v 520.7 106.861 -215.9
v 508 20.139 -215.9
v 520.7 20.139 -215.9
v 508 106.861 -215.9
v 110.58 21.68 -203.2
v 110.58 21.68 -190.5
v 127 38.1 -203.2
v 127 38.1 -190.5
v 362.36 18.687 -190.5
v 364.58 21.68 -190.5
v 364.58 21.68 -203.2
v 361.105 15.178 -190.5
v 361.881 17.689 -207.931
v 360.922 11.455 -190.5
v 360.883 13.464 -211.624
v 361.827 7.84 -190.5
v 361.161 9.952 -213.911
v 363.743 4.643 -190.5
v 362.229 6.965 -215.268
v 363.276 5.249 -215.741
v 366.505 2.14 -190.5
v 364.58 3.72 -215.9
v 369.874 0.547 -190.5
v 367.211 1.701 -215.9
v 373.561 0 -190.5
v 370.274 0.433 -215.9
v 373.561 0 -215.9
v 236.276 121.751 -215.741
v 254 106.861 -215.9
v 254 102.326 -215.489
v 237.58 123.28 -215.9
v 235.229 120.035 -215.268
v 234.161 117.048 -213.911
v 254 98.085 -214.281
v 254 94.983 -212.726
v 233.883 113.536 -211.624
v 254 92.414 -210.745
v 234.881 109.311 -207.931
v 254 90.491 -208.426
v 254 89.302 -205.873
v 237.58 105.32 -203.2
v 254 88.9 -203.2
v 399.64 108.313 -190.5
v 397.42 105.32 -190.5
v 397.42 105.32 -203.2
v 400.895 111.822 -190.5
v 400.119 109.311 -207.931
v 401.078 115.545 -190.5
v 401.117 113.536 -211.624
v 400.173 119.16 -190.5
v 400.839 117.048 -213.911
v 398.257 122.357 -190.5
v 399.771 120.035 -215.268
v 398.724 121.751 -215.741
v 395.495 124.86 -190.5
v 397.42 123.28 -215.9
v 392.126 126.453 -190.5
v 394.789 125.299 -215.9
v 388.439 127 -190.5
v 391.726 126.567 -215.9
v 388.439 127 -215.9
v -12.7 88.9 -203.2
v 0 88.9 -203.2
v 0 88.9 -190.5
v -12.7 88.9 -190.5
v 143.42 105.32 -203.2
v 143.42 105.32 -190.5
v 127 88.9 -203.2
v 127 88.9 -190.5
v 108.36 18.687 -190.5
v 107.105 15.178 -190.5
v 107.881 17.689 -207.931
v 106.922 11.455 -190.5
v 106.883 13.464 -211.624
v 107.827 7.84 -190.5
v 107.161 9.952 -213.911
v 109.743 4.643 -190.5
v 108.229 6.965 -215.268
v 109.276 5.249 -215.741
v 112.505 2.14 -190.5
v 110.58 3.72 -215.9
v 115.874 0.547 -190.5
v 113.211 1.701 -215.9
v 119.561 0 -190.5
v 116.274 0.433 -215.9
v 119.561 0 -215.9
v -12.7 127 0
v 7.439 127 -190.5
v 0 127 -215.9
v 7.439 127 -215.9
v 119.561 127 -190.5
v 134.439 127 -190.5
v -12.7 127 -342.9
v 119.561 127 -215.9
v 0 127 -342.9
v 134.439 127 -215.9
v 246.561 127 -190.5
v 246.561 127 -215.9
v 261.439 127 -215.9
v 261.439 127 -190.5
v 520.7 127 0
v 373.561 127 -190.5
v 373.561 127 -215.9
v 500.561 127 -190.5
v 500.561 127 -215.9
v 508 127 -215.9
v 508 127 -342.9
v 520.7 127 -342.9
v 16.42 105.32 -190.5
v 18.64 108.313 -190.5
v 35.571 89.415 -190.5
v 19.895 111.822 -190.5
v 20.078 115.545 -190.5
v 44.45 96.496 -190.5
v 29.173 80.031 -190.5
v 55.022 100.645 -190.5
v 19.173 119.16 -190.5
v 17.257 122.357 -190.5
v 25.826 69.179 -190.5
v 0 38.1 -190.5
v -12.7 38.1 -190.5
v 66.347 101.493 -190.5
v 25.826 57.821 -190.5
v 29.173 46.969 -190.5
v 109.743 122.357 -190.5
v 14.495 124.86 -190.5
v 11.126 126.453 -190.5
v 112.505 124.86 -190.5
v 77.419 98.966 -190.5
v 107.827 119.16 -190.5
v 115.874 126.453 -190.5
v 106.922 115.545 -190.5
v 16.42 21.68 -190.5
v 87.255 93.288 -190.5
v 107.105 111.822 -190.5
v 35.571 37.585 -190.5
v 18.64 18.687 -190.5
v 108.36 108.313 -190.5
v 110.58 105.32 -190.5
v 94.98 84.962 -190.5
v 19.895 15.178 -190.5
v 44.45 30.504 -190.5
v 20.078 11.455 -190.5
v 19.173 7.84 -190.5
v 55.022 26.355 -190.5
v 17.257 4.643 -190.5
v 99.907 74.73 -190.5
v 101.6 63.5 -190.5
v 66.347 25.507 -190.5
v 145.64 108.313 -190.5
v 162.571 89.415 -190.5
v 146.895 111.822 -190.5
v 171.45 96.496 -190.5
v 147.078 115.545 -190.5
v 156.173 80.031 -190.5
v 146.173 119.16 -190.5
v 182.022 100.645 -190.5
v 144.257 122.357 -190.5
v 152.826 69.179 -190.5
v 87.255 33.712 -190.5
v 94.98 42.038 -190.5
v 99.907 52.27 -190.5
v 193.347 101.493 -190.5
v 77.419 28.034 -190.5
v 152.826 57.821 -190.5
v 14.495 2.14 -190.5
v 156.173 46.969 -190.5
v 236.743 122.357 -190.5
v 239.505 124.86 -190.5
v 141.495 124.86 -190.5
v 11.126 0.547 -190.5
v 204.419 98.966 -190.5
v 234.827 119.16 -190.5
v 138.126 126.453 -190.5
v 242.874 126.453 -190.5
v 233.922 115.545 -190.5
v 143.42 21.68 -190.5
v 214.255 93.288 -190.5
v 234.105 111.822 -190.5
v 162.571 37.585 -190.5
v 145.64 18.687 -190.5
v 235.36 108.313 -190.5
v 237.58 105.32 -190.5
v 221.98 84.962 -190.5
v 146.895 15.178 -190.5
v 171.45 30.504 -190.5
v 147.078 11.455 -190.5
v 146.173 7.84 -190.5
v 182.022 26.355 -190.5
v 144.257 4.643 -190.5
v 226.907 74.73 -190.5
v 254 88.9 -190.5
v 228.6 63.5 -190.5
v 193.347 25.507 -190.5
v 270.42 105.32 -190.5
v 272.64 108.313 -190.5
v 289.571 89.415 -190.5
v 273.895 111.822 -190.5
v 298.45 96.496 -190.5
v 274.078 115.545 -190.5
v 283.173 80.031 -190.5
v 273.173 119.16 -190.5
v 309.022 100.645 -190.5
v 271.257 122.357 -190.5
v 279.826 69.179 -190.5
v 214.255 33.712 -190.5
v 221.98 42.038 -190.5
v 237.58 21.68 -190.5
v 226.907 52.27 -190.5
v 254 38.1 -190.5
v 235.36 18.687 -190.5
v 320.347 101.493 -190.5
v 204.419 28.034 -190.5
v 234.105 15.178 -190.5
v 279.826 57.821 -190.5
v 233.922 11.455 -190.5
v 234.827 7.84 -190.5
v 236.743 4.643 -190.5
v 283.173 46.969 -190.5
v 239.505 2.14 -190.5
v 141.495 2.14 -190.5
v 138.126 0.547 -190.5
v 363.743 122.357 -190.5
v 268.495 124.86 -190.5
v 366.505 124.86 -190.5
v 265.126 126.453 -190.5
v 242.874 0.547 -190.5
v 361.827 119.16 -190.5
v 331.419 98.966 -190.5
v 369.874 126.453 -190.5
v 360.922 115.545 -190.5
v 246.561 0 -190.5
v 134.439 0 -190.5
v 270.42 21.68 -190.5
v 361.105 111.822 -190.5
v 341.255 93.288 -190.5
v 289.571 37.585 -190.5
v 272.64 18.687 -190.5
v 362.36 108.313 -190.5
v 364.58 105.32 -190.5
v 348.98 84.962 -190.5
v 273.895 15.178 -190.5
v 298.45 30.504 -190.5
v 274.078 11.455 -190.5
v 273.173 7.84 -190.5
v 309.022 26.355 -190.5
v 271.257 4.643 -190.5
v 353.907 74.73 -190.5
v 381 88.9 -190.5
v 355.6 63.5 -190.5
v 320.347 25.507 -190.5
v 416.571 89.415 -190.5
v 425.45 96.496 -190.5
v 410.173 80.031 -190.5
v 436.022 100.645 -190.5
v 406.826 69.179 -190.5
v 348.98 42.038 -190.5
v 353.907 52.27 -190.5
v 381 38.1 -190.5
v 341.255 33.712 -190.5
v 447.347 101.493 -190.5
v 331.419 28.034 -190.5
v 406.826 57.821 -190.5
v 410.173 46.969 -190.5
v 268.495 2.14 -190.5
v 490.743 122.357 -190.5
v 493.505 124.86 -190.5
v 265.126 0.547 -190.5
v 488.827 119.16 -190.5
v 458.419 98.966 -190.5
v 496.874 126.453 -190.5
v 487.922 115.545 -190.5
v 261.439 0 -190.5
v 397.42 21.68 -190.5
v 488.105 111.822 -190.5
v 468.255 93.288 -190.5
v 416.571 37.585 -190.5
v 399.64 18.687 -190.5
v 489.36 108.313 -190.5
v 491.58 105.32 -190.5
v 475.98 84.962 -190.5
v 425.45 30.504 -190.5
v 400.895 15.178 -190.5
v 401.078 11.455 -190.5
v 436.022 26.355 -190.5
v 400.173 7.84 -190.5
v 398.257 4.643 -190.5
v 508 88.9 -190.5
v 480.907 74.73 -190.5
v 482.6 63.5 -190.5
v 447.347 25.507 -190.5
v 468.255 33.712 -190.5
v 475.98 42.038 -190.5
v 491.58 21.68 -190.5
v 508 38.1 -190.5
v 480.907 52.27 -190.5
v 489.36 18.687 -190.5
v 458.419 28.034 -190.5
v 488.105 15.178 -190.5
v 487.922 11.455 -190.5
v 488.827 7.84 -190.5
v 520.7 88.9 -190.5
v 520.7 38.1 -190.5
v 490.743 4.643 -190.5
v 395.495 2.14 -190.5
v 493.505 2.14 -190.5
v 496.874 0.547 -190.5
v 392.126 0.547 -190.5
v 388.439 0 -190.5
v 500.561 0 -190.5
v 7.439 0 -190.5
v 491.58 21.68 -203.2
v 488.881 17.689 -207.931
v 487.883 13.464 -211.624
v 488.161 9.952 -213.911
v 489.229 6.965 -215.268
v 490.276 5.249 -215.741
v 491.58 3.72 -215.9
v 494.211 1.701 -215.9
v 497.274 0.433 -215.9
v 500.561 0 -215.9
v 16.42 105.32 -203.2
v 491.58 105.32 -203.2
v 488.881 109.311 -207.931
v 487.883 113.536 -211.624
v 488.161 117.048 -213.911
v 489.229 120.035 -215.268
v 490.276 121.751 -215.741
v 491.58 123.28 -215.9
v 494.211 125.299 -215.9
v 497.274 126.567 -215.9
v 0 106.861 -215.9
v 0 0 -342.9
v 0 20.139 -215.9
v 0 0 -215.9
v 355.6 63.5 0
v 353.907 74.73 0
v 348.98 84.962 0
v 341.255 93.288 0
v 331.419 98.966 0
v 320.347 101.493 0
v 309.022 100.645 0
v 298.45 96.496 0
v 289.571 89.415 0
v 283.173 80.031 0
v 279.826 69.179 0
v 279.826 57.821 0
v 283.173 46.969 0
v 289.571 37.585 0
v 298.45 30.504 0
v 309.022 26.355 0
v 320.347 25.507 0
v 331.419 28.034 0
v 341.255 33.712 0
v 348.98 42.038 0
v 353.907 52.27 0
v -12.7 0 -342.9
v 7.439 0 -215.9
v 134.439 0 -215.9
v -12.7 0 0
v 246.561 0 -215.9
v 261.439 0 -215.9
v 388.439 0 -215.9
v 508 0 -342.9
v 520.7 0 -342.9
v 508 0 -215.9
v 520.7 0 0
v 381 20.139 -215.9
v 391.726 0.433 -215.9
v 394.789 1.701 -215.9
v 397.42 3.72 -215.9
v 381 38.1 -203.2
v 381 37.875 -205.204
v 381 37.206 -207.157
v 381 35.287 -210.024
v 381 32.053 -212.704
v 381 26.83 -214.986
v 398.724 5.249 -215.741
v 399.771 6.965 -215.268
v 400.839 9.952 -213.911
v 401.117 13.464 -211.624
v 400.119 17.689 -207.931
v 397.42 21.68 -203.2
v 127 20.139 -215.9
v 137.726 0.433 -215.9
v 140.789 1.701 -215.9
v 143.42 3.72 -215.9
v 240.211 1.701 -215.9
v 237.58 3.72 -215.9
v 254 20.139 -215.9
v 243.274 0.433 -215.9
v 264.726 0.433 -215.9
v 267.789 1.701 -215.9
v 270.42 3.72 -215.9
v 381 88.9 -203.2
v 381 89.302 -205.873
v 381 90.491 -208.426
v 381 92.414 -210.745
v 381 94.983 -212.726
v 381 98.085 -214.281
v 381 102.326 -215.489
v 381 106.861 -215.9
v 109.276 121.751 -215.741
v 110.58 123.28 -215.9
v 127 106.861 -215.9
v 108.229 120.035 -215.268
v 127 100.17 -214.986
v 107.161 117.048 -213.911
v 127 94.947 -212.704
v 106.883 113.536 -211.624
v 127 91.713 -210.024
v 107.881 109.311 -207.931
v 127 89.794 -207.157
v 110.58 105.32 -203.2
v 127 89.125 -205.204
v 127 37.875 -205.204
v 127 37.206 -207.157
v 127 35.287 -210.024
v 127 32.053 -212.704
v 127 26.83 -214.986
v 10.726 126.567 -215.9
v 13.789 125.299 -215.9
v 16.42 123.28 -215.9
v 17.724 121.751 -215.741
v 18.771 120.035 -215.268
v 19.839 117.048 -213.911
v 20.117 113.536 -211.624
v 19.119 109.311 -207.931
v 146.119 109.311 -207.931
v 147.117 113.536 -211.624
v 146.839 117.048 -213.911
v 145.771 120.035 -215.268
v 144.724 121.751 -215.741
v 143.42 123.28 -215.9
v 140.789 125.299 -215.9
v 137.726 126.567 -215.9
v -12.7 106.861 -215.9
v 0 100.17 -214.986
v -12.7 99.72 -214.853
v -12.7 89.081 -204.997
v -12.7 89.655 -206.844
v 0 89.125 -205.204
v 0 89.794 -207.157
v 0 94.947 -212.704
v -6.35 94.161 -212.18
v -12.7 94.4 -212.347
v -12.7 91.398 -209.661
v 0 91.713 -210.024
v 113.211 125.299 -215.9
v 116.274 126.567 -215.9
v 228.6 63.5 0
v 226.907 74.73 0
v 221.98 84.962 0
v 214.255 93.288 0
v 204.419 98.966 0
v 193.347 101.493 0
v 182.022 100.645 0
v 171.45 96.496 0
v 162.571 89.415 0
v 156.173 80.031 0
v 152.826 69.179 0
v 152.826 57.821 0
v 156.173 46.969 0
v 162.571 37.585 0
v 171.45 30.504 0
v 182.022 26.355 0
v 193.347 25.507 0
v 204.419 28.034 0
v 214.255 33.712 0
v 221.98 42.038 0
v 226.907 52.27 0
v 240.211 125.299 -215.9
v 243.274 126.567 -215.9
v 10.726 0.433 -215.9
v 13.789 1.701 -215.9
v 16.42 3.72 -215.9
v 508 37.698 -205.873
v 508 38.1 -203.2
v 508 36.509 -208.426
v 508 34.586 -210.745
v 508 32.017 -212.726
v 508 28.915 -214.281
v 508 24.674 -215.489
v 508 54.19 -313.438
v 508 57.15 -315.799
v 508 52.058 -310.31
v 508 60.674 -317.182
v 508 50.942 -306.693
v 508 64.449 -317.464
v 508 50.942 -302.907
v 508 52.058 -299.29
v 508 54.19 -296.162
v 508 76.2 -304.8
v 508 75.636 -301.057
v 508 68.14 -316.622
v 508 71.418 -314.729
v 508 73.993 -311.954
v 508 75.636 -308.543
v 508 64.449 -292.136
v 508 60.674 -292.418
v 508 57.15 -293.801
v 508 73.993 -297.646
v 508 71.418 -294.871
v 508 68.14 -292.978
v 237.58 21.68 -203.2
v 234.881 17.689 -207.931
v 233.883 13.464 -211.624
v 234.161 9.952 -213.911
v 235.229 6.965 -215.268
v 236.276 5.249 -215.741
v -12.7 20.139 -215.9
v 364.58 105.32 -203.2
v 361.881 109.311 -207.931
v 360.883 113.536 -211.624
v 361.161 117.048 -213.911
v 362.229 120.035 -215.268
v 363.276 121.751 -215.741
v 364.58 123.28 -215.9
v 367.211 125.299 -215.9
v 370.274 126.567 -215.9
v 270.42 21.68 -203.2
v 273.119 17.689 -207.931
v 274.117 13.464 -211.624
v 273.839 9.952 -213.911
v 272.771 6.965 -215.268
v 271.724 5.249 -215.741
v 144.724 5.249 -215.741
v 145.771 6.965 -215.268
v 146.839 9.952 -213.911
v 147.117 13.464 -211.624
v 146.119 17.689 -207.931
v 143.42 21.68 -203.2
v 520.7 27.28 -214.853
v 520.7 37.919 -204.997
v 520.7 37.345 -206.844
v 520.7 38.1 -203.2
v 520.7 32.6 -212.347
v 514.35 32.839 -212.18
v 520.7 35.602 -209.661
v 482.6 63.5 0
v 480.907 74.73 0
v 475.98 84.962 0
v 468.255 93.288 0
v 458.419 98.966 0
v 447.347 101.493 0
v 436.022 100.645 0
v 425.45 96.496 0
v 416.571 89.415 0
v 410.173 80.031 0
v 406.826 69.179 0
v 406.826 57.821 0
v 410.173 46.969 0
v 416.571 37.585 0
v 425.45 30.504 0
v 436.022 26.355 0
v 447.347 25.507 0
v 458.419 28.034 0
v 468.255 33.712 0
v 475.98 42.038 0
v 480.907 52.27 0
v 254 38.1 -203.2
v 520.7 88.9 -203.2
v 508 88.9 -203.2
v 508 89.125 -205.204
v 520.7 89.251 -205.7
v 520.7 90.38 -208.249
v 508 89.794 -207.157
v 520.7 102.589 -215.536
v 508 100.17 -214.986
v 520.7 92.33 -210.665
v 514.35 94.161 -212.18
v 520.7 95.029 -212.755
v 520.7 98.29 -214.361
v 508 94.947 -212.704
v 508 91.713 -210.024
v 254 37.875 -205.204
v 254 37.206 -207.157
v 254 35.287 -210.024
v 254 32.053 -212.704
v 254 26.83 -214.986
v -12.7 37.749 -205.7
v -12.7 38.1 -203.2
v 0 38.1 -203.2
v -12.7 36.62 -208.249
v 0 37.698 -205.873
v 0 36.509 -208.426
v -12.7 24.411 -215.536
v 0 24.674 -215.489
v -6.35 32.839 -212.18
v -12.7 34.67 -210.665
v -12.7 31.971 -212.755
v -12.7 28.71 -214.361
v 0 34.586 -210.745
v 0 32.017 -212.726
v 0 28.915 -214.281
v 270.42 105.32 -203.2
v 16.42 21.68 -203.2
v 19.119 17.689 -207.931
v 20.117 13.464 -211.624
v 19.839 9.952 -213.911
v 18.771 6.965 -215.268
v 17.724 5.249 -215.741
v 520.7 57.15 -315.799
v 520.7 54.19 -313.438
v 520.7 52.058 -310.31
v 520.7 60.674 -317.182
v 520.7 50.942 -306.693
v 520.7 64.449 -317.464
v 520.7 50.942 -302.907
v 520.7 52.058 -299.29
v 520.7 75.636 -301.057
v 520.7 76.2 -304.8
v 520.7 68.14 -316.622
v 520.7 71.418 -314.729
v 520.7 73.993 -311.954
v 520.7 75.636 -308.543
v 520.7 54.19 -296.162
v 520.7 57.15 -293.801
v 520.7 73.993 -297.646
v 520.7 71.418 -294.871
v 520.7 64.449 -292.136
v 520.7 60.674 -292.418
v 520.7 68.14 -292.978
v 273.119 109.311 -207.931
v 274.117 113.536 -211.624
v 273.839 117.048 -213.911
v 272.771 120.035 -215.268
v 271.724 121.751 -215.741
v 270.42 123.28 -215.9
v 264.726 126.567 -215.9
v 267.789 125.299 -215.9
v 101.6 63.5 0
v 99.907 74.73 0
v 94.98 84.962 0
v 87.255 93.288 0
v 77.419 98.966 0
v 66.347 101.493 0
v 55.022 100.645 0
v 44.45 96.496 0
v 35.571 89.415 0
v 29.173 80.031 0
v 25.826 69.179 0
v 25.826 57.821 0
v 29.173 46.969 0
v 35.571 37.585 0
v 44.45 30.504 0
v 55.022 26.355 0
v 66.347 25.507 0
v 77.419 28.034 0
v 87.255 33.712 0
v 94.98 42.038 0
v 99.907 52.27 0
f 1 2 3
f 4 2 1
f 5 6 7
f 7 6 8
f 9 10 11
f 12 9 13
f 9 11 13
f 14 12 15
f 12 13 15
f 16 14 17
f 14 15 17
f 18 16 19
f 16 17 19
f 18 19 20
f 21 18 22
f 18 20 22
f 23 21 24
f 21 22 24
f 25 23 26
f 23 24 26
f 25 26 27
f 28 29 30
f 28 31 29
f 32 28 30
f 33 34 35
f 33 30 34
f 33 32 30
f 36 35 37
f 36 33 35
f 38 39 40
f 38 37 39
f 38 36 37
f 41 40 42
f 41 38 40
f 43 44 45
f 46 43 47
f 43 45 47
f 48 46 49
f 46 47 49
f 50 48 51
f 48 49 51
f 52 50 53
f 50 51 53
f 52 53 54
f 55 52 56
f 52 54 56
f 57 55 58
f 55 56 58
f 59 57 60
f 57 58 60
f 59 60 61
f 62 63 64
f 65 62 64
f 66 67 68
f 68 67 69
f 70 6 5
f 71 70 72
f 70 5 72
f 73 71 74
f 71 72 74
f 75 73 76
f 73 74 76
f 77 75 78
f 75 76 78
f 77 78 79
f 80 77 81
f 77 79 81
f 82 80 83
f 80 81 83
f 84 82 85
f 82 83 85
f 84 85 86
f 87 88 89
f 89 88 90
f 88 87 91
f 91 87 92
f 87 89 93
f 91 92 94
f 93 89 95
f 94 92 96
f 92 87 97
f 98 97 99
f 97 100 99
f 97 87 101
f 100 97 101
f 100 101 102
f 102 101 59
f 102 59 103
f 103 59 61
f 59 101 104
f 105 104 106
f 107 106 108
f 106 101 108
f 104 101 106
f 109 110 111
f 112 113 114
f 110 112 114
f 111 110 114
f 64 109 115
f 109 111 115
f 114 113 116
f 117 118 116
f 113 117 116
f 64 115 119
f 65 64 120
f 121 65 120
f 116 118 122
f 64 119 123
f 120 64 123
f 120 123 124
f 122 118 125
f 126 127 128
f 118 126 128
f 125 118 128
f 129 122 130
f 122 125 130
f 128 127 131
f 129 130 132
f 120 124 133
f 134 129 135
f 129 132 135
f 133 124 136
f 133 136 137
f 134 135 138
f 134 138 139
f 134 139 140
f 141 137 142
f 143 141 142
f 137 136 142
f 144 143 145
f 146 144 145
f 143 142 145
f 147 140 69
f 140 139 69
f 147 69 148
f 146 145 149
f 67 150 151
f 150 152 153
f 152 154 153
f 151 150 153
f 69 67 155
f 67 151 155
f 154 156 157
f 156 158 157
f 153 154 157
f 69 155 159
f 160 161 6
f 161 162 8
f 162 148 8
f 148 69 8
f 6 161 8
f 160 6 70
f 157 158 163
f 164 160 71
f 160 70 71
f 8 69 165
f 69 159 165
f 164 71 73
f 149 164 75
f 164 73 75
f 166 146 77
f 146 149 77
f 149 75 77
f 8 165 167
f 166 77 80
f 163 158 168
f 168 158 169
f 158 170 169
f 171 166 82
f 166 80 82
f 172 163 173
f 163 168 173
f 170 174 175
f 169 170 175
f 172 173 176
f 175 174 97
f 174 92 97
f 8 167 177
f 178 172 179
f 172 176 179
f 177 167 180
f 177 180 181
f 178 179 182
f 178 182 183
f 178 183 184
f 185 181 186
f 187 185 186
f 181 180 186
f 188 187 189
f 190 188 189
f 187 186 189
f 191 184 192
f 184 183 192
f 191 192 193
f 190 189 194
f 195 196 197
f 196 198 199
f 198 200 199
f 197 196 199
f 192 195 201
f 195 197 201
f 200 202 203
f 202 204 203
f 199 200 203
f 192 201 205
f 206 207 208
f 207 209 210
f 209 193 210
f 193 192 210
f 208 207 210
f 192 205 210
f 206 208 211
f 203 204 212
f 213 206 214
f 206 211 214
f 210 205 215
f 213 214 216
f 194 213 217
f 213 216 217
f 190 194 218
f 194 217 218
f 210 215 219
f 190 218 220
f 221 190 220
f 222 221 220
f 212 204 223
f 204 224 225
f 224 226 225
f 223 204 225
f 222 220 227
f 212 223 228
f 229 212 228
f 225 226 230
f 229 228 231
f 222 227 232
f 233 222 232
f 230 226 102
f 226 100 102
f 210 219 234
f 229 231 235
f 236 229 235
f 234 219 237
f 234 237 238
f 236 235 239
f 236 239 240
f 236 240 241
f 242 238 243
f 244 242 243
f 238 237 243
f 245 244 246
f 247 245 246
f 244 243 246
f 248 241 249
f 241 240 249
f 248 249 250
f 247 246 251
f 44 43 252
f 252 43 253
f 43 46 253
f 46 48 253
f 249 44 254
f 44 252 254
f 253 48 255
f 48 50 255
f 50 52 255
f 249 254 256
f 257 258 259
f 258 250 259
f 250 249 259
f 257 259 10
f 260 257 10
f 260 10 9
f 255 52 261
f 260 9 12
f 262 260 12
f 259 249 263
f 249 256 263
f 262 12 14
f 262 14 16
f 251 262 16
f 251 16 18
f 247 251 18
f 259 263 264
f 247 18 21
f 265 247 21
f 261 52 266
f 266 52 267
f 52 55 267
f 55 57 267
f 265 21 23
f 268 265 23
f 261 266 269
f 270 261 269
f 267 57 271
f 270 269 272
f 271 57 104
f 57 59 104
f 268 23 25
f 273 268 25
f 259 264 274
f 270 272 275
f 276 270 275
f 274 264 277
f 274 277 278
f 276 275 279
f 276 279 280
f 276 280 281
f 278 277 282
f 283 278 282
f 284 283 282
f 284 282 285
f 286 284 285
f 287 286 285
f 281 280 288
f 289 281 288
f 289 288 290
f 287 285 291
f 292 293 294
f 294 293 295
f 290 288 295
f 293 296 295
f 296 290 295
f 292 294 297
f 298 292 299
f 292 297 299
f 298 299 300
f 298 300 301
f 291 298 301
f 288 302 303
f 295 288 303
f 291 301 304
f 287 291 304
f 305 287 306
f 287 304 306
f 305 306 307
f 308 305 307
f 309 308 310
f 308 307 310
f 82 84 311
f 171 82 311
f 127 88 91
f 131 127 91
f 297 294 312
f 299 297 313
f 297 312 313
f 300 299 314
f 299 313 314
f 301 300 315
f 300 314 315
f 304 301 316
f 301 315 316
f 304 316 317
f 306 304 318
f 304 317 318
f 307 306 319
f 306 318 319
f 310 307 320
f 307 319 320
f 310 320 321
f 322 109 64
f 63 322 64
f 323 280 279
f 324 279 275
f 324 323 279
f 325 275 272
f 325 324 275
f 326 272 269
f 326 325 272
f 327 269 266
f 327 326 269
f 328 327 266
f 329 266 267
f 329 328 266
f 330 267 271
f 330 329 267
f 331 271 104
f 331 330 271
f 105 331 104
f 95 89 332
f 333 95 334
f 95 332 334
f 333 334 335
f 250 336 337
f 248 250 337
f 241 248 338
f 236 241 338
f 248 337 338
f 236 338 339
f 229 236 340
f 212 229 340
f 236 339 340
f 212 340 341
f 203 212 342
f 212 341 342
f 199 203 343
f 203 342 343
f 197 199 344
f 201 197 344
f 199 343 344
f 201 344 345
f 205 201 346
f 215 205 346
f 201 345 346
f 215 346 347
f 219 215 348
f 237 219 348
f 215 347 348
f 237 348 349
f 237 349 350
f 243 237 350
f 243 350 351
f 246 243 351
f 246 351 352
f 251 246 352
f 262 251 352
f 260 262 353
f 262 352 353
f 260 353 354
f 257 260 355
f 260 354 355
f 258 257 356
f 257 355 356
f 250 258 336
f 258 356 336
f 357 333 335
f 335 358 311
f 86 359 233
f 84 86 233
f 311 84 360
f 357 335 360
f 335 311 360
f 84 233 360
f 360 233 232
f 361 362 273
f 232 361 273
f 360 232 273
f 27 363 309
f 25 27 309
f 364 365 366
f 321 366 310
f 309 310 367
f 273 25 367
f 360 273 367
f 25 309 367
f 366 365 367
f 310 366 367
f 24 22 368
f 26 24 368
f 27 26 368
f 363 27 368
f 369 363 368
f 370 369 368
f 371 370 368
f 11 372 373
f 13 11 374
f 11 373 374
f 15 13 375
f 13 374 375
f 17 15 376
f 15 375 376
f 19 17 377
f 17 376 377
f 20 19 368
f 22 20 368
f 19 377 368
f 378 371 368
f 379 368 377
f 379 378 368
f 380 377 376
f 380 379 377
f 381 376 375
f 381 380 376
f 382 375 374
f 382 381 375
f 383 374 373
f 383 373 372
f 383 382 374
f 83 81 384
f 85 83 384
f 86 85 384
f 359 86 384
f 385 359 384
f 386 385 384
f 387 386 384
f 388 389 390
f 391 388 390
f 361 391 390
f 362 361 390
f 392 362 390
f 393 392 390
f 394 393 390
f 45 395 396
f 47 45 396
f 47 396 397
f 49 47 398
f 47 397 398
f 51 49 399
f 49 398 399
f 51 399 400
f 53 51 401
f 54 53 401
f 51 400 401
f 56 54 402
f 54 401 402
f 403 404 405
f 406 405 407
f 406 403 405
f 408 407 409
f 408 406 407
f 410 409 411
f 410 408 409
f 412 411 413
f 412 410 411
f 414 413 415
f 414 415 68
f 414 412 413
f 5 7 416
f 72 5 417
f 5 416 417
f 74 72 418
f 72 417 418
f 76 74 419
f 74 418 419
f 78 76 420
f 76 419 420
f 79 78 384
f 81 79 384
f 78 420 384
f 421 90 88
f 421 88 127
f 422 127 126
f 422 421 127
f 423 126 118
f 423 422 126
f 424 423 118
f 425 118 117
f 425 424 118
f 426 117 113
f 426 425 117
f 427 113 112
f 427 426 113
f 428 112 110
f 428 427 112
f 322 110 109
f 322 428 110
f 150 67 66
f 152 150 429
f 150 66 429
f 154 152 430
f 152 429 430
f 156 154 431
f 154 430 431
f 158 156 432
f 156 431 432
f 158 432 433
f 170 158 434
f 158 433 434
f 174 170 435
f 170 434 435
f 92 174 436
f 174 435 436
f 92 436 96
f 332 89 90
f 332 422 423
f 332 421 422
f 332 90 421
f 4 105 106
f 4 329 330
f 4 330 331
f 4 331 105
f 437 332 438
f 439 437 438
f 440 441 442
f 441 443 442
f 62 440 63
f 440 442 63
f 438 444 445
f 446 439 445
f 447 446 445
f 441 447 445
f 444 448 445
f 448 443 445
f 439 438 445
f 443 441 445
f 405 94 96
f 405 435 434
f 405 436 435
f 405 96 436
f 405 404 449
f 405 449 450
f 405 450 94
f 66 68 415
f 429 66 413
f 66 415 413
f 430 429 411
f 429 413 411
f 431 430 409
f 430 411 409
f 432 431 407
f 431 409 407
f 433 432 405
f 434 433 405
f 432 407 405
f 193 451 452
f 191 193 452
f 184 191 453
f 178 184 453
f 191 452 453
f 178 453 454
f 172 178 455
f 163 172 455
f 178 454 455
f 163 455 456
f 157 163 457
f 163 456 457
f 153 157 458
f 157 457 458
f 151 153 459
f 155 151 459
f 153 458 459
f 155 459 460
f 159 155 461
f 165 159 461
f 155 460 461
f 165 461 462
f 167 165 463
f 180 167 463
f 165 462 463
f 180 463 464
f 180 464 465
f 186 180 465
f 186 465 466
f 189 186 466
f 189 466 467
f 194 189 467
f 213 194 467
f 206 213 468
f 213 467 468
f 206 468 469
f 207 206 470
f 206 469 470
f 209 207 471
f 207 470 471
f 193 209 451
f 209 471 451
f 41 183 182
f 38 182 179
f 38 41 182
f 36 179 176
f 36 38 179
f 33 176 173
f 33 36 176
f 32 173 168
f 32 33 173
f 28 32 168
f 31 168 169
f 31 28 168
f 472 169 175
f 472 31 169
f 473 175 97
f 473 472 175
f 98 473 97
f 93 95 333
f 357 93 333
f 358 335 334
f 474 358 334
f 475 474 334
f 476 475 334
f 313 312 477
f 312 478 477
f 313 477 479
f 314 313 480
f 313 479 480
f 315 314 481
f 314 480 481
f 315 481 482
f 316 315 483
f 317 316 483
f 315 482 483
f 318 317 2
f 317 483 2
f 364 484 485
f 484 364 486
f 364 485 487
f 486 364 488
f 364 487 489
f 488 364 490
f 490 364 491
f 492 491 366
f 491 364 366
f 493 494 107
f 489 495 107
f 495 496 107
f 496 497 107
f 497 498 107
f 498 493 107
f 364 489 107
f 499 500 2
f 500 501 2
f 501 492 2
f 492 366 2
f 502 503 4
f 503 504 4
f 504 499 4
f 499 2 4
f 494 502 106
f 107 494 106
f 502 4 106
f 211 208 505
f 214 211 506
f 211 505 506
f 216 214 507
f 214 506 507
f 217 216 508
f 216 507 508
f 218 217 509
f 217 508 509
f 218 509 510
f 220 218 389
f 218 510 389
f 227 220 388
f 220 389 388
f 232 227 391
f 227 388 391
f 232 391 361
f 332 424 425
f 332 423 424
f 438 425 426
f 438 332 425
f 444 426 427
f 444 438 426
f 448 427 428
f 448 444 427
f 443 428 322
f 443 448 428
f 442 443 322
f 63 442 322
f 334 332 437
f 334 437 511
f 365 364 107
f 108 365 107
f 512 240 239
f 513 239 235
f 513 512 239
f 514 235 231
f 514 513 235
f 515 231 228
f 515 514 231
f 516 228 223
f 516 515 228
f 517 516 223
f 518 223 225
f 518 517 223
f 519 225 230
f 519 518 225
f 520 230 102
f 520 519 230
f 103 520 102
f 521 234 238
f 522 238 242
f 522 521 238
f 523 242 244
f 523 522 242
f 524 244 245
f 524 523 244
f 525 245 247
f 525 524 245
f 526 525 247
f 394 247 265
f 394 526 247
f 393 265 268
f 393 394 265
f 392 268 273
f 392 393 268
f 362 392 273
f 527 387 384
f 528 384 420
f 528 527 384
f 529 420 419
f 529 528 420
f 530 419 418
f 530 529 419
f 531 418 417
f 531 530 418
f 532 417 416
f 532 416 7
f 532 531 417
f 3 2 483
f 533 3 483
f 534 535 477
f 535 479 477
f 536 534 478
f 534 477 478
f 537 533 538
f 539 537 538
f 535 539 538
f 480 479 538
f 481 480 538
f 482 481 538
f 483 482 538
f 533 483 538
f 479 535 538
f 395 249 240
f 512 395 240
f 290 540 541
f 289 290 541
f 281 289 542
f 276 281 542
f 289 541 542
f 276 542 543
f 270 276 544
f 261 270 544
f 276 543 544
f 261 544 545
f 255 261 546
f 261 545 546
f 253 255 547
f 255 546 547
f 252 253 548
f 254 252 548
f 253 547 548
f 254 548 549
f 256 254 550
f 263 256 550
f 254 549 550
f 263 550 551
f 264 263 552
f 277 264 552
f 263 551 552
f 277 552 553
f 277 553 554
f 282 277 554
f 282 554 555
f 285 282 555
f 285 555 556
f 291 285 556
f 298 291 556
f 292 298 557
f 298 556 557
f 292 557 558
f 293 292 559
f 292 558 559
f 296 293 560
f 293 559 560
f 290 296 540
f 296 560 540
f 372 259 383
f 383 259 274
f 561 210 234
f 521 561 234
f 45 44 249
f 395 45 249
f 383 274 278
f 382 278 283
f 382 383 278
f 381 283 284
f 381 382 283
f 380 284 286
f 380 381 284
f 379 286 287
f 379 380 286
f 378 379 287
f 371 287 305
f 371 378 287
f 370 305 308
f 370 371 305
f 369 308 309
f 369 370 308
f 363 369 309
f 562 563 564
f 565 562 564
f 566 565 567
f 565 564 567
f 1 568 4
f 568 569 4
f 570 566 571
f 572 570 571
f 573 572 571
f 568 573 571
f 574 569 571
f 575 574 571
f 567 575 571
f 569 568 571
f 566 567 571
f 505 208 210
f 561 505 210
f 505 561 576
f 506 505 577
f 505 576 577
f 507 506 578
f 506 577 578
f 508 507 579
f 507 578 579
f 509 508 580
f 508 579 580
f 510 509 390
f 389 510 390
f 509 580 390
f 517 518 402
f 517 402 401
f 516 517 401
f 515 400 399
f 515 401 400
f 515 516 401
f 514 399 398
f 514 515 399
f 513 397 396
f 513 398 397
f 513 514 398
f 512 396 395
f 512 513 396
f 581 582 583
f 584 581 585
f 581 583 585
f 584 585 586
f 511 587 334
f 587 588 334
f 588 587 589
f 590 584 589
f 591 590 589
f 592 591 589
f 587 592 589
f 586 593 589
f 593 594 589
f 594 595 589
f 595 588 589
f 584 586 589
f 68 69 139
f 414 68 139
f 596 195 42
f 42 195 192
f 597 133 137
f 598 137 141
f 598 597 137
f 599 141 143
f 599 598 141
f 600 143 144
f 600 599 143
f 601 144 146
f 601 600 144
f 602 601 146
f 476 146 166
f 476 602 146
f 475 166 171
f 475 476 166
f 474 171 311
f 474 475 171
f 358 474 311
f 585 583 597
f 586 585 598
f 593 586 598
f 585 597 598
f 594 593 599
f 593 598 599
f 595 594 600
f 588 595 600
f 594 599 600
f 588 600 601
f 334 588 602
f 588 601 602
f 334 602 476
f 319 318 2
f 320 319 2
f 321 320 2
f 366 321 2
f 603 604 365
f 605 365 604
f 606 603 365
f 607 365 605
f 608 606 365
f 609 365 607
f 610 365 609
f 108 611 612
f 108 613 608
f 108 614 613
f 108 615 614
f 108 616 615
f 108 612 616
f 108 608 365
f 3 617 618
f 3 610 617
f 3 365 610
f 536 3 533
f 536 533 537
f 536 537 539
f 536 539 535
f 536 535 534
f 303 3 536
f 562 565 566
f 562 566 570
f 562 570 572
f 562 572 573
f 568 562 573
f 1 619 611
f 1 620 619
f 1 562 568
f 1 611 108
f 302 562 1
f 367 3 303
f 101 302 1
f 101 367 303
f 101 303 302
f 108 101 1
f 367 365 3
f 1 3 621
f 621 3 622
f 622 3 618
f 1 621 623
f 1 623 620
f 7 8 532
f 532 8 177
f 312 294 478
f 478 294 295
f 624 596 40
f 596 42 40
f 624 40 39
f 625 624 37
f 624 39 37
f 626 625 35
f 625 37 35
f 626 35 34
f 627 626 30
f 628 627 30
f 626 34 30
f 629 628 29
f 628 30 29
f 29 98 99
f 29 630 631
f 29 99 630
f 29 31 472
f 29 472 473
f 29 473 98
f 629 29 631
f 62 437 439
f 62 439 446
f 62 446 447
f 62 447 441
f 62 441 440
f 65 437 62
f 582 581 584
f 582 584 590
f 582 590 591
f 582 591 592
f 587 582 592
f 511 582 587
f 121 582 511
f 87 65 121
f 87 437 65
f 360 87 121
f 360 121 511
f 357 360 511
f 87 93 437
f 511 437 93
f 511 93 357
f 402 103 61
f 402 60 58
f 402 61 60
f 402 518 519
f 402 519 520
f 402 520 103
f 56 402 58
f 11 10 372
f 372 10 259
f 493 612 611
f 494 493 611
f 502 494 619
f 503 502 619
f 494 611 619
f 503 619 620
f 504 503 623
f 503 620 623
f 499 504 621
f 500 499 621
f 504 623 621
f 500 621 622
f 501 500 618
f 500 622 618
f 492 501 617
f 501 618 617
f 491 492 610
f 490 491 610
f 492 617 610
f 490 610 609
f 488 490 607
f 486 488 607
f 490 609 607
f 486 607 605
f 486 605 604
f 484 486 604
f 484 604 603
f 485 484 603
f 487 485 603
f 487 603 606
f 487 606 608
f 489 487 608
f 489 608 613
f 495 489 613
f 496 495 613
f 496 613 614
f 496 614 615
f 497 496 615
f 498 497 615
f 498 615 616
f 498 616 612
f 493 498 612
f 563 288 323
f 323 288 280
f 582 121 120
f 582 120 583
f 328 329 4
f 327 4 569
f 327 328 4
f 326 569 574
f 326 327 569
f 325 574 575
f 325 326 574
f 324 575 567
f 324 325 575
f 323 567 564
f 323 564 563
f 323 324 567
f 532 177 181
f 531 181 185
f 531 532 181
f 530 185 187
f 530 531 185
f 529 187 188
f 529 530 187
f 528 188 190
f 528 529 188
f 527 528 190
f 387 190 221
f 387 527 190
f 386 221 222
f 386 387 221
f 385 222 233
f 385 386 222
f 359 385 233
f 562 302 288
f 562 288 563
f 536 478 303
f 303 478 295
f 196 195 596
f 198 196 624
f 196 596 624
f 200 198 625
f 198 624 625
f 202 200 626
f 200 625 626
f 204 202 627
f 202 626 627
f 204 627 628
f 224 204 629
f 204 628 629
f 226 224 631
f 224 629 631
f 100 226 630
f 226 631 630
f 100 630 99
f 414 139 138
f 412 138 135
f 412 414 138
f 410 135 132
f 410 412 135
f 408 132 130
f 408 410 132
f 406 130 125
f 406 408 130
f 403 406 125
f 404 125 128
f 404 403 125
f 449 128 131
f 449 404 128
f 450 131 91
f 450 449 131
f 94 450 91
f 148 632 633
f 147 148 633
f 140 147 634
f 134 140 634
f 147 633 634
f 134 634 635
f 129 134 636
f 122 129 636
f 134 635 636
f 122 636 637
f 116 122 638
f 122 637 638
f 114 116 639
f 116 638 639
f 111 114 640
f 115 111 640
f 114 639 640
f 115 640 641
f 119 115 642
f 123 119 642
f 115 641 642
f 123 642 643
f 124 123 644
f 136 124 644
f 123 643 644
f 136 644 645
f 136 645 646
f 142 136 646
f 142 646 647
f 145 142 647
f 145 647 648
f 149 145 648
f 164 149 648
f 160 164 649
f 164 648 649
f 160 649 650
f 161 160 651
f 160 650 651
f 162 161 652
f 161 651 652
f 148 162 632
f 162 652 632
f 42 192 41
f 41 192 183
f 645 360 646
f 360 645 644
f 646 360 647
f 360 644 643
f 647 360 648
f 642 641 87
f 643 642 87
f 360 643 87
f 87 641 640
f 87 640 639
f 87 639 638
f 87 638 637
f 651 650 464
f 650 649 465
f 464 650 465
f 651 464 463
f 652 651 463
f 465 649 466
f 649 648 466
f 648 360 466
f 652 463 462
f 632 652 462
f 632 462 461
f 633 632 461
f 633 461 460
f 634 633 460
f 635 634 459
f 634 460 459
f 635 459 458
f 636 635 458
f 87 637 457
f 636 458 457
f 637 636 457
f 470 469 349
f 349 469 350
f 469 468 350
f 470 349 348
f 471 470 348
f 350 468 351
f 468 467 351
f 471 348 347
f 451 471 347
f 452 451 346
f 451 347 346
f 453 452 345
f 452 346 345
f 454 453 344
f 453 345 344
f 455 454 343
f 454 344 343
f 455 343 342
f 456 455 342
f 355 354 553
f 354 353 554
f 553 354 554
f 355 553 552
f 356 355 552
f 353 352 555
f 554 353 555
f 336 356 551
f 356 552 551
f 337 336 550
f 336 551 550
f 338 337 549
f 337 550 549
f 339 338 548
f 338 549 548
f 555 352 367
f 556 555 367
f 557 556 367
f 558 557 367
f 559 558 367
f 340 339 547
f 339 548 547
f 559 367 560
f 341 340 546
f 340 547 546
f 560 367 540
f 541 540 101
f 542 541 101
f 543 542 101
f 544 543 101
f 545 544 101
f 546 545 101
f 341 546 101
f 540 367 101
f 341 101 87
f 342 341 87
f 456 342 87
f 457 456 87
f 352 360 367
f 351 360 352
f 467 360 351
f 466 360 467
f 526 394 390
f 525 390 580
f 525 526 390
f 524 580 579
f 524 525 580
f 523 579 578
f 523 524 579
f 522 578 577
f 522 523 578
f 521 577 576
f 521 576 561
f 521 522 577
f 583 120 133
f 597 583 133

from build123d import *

# Parameters (mm, degrees)
F0_W      = 508
F0_H      = 127
F0_R      = 38.1
F1_DEPTH  = 190.5
F3_DEPTH  = 25.4
F4_R      = 12.7
F5_W      = 127
F5_H      = 127
F6_DEPTH  = 12.7
F7_W      = 127
F7_H      = 127
F8_DEPTH  = 12.7
F9_R      = 12.7
F10_DEPTH = 25.4


with BuildPart() as f1:
    # F0 (on Top) → F1 (new body)
    with BuildSketch(Plane.XY):
        with Locations((254, 63.5)):
            Rectangle(F0_W, F0_H)
        with Locations((63.5, 63.5)):
            Circle(F0_R, mode=Mode.SUBTRACT)
        with Locations((190.5, 63.5)):
            Circle(F0_R, mode=Mode.SUBTRACT)
        with Locations((317.5, 63.5)):
            Circle(F0_R, mode=Mode.SUBTRACT)
        with Locations((444.5, 63.5)):
            Circle(F0_R, mode=Mode.SUBTRACT)
    extrude(amount=-F1_DEPTH)

    # F2 (on face) → F3 (join)
    with BuildSketch(Plane(origin=(0, 0, -190.5), x_dir=(1, 0, 0), z_dir=(0, 0, -1))):
        Polygon((254, 0), (215.9, 0), (254, -38.1), align=None)
        Polygon((254, 0), (254, -38.1), (292.1, 0), align=None)
        Polygon((254, -127), (254, -88.9), (215.9, -127), align=None)
        Polygon((292.1, -127), (254, -88.9), (254, -127), align=None)
        Polygon((127, 0), (127, -38.1), (165.1, 0), align=None)
        Polygon((127, 0), (88.9, 0), (127, -38.1), align=None)
        Polygon((127, -88.9), (88.9, -127), (127, -127), align=None)
        Polygon((165.1, -127), (127, -88.9), (127, -127), align=None)
        Polygon((0, -38.1), (38.1, 0), (0, 0), align=None)
        Polygon((38.1, -127), (0, -88.9), (0, -127), align=None)
        Polygon((381, 0), (342.9, 0), (381, -38.1), align=None)
        Polygon((381, 0), (381, -38.1), (419.1, 0), align=None)
        Polygon((508, 0), (469.9, 0), (508, -38.1), align=None)
        Polygon((508, -88.9), (469.9, -127), (508, -127), align=None)
        Polygon((381, -88.9), (342.9, -127), (381, -127), align=None)
        Polygon((419.1, -127), (381, -88.9), (381, -127), align=None)
    extrude(amount=F3_DEPTH)

    # F4
    f4_edges = [f1.edges().sort_by_distance(p)[0] for p in [
        (400.05, 19.05, -215.9),
        (361.95, 19.05, -215.9),
        (488.95, 19.05, -215.9),
        (488.95, 107.95, -215.9),
        (400.05, 107.95, -215.9),
        (361.95, 107.95, -215.9),
        (273.05, 19.05, -215.9),
        (273.05, 107.95, -215.9),
        (234.95, 107.95, -215.9),
        (234.95, 19.05, -215.9),
        (146.05, 19.05, -215.9),
        (107.95, 19.05, -215.9),
        (107.95, 107.95, -215.9),
        (146.05, 107.95, -215.9),
        (19.05, 19.05, -215.9),
        (19.05, 107.95, -215.9),
        (292.1, 0, -203.2),
        (215.9, 0, -203.2),
        (292.1, 127, -203.2),
        (215.9, 127, -203.2),
        (342.9, 127, -203.2),
        (419.1, 127, -203.2),
        (469.9, 127, -203.2),
        (469.9, 0, -203.2),
        (419.1, 0, -203.2),
        (342.9, 0, -203.2),
        (88.9, 0, -203.2),
        (165.1, 0, -203.2),
        (88.9, 127, -203.2),
        (165.1, 127, -203.2),
        (38.1, 127, -203.2),
        (38.1, 0, -203.2),
    ]]
    fillet(f4_edges, radius=F4_R)

    # F5 (on face) → F6 (join)
    with BuildSketch(Plane.YZ.offset(508)):
        with Locations((63.5, -279.4)):
            Rectangle(F5_W, F5_H)
        with BuildLine():
            Line((106.8605122421, -215.9), (127, -215.9))
            Line((127, -215.9), (127, 0))
            Line((127, 0), (0, 0))
            Line((0, 0), (0, -215.9))
            Line((0, -215.9), (20.1394877579, -215.9))
            add(Edge.make_bspline(
                [(20.1394877579, -215.9), (38.1, -215.9), (38.1, -203.2)],
                knots=[4.7123889804, 4.7123889804, 4.7123889804, 6.2831853072, 6.2831853072, 6.2831853072], degree=2, weights=[1, 0.7071067812, 1]))
            Line((38.1, -203.2), (38.1, -190.5))
            Line((38.1, -190.5), (88.9, -190.5))
            Line((88.9, -190.5), (88.9, -203.2))
            add(Edge.make_bspline(
                [(88.9, -203.2), (88.9, -215.9), (106.8605122421, -215.9)],
                knots=[3.1415926536, 3.1415926536, 3.1415926536, 4.7123889804, 4.7123889804, 4.7123889804], degree=2, weights=[1, 0.7071067812, 1]))
        make_face()
    extrude(amount=F6_DEPTH)

    # F7 (on face) → F8 (join)
    with BuildSketch(Plane(origin=(0, 0, 0), x_dir=(0, -1, 0), z_dir=(-1, 0, 0))):
        with Locations((-63.5, -279.4)):
            Rectangle(F7_W, F7_H)
        with BuildLine():
            Line((-20.1394877579, -215.9), (0, -215.9))
            Line((0, -215.9), (0, 0))
            Line((0, 0), (-127, 0))
            Line((-127, 0), (-127, -215.9))
            Line((-127, -215.9), (-106.8605122421, -215.9))
            add(Edge.make_bspline(
                [(-106.8605122421, -215.9), (-88.9, -215.9), (-88.9, -203.2)],
                knots=[4.7123889804, 4.7123889804, 4.7123889804, 6.2831853072, 6.2831853072, 6.2831853072], degree=2, weights=[1, 0.7071067812, 1]))
            Line((-88.9, -203.2), (-88.9, -190.5))
            Line((-88.9, -190.5), (-38.1, -190.5))
            Line((-38.1, -190.5), (-38.1, -203.2))
            add(Edge.make_bspline(
                [(-38.1, -203.2), (-38.1, -215.9), (-20.1394877579, -215.9)],
                knots=[3.1415926536, 3.1415926536, 3.1415926536, 4.7123889804, 4.7123889804, 4.7123889804], degree=2, weights=[1, 0.7071067812, 1]))
        make_face()
    extrude(amount=F8_DEPTH)

    # F9 (on face) → F10 (cut)
    with BuildSketch(Plane.YZ.offset(520.7)):
        with Locations((63.5, -304.8)):
            Circle(F9_R)
    extrude(amount=-F10_DEPTH, mode=Mode.SUBTRACT)


solid = f1.part
